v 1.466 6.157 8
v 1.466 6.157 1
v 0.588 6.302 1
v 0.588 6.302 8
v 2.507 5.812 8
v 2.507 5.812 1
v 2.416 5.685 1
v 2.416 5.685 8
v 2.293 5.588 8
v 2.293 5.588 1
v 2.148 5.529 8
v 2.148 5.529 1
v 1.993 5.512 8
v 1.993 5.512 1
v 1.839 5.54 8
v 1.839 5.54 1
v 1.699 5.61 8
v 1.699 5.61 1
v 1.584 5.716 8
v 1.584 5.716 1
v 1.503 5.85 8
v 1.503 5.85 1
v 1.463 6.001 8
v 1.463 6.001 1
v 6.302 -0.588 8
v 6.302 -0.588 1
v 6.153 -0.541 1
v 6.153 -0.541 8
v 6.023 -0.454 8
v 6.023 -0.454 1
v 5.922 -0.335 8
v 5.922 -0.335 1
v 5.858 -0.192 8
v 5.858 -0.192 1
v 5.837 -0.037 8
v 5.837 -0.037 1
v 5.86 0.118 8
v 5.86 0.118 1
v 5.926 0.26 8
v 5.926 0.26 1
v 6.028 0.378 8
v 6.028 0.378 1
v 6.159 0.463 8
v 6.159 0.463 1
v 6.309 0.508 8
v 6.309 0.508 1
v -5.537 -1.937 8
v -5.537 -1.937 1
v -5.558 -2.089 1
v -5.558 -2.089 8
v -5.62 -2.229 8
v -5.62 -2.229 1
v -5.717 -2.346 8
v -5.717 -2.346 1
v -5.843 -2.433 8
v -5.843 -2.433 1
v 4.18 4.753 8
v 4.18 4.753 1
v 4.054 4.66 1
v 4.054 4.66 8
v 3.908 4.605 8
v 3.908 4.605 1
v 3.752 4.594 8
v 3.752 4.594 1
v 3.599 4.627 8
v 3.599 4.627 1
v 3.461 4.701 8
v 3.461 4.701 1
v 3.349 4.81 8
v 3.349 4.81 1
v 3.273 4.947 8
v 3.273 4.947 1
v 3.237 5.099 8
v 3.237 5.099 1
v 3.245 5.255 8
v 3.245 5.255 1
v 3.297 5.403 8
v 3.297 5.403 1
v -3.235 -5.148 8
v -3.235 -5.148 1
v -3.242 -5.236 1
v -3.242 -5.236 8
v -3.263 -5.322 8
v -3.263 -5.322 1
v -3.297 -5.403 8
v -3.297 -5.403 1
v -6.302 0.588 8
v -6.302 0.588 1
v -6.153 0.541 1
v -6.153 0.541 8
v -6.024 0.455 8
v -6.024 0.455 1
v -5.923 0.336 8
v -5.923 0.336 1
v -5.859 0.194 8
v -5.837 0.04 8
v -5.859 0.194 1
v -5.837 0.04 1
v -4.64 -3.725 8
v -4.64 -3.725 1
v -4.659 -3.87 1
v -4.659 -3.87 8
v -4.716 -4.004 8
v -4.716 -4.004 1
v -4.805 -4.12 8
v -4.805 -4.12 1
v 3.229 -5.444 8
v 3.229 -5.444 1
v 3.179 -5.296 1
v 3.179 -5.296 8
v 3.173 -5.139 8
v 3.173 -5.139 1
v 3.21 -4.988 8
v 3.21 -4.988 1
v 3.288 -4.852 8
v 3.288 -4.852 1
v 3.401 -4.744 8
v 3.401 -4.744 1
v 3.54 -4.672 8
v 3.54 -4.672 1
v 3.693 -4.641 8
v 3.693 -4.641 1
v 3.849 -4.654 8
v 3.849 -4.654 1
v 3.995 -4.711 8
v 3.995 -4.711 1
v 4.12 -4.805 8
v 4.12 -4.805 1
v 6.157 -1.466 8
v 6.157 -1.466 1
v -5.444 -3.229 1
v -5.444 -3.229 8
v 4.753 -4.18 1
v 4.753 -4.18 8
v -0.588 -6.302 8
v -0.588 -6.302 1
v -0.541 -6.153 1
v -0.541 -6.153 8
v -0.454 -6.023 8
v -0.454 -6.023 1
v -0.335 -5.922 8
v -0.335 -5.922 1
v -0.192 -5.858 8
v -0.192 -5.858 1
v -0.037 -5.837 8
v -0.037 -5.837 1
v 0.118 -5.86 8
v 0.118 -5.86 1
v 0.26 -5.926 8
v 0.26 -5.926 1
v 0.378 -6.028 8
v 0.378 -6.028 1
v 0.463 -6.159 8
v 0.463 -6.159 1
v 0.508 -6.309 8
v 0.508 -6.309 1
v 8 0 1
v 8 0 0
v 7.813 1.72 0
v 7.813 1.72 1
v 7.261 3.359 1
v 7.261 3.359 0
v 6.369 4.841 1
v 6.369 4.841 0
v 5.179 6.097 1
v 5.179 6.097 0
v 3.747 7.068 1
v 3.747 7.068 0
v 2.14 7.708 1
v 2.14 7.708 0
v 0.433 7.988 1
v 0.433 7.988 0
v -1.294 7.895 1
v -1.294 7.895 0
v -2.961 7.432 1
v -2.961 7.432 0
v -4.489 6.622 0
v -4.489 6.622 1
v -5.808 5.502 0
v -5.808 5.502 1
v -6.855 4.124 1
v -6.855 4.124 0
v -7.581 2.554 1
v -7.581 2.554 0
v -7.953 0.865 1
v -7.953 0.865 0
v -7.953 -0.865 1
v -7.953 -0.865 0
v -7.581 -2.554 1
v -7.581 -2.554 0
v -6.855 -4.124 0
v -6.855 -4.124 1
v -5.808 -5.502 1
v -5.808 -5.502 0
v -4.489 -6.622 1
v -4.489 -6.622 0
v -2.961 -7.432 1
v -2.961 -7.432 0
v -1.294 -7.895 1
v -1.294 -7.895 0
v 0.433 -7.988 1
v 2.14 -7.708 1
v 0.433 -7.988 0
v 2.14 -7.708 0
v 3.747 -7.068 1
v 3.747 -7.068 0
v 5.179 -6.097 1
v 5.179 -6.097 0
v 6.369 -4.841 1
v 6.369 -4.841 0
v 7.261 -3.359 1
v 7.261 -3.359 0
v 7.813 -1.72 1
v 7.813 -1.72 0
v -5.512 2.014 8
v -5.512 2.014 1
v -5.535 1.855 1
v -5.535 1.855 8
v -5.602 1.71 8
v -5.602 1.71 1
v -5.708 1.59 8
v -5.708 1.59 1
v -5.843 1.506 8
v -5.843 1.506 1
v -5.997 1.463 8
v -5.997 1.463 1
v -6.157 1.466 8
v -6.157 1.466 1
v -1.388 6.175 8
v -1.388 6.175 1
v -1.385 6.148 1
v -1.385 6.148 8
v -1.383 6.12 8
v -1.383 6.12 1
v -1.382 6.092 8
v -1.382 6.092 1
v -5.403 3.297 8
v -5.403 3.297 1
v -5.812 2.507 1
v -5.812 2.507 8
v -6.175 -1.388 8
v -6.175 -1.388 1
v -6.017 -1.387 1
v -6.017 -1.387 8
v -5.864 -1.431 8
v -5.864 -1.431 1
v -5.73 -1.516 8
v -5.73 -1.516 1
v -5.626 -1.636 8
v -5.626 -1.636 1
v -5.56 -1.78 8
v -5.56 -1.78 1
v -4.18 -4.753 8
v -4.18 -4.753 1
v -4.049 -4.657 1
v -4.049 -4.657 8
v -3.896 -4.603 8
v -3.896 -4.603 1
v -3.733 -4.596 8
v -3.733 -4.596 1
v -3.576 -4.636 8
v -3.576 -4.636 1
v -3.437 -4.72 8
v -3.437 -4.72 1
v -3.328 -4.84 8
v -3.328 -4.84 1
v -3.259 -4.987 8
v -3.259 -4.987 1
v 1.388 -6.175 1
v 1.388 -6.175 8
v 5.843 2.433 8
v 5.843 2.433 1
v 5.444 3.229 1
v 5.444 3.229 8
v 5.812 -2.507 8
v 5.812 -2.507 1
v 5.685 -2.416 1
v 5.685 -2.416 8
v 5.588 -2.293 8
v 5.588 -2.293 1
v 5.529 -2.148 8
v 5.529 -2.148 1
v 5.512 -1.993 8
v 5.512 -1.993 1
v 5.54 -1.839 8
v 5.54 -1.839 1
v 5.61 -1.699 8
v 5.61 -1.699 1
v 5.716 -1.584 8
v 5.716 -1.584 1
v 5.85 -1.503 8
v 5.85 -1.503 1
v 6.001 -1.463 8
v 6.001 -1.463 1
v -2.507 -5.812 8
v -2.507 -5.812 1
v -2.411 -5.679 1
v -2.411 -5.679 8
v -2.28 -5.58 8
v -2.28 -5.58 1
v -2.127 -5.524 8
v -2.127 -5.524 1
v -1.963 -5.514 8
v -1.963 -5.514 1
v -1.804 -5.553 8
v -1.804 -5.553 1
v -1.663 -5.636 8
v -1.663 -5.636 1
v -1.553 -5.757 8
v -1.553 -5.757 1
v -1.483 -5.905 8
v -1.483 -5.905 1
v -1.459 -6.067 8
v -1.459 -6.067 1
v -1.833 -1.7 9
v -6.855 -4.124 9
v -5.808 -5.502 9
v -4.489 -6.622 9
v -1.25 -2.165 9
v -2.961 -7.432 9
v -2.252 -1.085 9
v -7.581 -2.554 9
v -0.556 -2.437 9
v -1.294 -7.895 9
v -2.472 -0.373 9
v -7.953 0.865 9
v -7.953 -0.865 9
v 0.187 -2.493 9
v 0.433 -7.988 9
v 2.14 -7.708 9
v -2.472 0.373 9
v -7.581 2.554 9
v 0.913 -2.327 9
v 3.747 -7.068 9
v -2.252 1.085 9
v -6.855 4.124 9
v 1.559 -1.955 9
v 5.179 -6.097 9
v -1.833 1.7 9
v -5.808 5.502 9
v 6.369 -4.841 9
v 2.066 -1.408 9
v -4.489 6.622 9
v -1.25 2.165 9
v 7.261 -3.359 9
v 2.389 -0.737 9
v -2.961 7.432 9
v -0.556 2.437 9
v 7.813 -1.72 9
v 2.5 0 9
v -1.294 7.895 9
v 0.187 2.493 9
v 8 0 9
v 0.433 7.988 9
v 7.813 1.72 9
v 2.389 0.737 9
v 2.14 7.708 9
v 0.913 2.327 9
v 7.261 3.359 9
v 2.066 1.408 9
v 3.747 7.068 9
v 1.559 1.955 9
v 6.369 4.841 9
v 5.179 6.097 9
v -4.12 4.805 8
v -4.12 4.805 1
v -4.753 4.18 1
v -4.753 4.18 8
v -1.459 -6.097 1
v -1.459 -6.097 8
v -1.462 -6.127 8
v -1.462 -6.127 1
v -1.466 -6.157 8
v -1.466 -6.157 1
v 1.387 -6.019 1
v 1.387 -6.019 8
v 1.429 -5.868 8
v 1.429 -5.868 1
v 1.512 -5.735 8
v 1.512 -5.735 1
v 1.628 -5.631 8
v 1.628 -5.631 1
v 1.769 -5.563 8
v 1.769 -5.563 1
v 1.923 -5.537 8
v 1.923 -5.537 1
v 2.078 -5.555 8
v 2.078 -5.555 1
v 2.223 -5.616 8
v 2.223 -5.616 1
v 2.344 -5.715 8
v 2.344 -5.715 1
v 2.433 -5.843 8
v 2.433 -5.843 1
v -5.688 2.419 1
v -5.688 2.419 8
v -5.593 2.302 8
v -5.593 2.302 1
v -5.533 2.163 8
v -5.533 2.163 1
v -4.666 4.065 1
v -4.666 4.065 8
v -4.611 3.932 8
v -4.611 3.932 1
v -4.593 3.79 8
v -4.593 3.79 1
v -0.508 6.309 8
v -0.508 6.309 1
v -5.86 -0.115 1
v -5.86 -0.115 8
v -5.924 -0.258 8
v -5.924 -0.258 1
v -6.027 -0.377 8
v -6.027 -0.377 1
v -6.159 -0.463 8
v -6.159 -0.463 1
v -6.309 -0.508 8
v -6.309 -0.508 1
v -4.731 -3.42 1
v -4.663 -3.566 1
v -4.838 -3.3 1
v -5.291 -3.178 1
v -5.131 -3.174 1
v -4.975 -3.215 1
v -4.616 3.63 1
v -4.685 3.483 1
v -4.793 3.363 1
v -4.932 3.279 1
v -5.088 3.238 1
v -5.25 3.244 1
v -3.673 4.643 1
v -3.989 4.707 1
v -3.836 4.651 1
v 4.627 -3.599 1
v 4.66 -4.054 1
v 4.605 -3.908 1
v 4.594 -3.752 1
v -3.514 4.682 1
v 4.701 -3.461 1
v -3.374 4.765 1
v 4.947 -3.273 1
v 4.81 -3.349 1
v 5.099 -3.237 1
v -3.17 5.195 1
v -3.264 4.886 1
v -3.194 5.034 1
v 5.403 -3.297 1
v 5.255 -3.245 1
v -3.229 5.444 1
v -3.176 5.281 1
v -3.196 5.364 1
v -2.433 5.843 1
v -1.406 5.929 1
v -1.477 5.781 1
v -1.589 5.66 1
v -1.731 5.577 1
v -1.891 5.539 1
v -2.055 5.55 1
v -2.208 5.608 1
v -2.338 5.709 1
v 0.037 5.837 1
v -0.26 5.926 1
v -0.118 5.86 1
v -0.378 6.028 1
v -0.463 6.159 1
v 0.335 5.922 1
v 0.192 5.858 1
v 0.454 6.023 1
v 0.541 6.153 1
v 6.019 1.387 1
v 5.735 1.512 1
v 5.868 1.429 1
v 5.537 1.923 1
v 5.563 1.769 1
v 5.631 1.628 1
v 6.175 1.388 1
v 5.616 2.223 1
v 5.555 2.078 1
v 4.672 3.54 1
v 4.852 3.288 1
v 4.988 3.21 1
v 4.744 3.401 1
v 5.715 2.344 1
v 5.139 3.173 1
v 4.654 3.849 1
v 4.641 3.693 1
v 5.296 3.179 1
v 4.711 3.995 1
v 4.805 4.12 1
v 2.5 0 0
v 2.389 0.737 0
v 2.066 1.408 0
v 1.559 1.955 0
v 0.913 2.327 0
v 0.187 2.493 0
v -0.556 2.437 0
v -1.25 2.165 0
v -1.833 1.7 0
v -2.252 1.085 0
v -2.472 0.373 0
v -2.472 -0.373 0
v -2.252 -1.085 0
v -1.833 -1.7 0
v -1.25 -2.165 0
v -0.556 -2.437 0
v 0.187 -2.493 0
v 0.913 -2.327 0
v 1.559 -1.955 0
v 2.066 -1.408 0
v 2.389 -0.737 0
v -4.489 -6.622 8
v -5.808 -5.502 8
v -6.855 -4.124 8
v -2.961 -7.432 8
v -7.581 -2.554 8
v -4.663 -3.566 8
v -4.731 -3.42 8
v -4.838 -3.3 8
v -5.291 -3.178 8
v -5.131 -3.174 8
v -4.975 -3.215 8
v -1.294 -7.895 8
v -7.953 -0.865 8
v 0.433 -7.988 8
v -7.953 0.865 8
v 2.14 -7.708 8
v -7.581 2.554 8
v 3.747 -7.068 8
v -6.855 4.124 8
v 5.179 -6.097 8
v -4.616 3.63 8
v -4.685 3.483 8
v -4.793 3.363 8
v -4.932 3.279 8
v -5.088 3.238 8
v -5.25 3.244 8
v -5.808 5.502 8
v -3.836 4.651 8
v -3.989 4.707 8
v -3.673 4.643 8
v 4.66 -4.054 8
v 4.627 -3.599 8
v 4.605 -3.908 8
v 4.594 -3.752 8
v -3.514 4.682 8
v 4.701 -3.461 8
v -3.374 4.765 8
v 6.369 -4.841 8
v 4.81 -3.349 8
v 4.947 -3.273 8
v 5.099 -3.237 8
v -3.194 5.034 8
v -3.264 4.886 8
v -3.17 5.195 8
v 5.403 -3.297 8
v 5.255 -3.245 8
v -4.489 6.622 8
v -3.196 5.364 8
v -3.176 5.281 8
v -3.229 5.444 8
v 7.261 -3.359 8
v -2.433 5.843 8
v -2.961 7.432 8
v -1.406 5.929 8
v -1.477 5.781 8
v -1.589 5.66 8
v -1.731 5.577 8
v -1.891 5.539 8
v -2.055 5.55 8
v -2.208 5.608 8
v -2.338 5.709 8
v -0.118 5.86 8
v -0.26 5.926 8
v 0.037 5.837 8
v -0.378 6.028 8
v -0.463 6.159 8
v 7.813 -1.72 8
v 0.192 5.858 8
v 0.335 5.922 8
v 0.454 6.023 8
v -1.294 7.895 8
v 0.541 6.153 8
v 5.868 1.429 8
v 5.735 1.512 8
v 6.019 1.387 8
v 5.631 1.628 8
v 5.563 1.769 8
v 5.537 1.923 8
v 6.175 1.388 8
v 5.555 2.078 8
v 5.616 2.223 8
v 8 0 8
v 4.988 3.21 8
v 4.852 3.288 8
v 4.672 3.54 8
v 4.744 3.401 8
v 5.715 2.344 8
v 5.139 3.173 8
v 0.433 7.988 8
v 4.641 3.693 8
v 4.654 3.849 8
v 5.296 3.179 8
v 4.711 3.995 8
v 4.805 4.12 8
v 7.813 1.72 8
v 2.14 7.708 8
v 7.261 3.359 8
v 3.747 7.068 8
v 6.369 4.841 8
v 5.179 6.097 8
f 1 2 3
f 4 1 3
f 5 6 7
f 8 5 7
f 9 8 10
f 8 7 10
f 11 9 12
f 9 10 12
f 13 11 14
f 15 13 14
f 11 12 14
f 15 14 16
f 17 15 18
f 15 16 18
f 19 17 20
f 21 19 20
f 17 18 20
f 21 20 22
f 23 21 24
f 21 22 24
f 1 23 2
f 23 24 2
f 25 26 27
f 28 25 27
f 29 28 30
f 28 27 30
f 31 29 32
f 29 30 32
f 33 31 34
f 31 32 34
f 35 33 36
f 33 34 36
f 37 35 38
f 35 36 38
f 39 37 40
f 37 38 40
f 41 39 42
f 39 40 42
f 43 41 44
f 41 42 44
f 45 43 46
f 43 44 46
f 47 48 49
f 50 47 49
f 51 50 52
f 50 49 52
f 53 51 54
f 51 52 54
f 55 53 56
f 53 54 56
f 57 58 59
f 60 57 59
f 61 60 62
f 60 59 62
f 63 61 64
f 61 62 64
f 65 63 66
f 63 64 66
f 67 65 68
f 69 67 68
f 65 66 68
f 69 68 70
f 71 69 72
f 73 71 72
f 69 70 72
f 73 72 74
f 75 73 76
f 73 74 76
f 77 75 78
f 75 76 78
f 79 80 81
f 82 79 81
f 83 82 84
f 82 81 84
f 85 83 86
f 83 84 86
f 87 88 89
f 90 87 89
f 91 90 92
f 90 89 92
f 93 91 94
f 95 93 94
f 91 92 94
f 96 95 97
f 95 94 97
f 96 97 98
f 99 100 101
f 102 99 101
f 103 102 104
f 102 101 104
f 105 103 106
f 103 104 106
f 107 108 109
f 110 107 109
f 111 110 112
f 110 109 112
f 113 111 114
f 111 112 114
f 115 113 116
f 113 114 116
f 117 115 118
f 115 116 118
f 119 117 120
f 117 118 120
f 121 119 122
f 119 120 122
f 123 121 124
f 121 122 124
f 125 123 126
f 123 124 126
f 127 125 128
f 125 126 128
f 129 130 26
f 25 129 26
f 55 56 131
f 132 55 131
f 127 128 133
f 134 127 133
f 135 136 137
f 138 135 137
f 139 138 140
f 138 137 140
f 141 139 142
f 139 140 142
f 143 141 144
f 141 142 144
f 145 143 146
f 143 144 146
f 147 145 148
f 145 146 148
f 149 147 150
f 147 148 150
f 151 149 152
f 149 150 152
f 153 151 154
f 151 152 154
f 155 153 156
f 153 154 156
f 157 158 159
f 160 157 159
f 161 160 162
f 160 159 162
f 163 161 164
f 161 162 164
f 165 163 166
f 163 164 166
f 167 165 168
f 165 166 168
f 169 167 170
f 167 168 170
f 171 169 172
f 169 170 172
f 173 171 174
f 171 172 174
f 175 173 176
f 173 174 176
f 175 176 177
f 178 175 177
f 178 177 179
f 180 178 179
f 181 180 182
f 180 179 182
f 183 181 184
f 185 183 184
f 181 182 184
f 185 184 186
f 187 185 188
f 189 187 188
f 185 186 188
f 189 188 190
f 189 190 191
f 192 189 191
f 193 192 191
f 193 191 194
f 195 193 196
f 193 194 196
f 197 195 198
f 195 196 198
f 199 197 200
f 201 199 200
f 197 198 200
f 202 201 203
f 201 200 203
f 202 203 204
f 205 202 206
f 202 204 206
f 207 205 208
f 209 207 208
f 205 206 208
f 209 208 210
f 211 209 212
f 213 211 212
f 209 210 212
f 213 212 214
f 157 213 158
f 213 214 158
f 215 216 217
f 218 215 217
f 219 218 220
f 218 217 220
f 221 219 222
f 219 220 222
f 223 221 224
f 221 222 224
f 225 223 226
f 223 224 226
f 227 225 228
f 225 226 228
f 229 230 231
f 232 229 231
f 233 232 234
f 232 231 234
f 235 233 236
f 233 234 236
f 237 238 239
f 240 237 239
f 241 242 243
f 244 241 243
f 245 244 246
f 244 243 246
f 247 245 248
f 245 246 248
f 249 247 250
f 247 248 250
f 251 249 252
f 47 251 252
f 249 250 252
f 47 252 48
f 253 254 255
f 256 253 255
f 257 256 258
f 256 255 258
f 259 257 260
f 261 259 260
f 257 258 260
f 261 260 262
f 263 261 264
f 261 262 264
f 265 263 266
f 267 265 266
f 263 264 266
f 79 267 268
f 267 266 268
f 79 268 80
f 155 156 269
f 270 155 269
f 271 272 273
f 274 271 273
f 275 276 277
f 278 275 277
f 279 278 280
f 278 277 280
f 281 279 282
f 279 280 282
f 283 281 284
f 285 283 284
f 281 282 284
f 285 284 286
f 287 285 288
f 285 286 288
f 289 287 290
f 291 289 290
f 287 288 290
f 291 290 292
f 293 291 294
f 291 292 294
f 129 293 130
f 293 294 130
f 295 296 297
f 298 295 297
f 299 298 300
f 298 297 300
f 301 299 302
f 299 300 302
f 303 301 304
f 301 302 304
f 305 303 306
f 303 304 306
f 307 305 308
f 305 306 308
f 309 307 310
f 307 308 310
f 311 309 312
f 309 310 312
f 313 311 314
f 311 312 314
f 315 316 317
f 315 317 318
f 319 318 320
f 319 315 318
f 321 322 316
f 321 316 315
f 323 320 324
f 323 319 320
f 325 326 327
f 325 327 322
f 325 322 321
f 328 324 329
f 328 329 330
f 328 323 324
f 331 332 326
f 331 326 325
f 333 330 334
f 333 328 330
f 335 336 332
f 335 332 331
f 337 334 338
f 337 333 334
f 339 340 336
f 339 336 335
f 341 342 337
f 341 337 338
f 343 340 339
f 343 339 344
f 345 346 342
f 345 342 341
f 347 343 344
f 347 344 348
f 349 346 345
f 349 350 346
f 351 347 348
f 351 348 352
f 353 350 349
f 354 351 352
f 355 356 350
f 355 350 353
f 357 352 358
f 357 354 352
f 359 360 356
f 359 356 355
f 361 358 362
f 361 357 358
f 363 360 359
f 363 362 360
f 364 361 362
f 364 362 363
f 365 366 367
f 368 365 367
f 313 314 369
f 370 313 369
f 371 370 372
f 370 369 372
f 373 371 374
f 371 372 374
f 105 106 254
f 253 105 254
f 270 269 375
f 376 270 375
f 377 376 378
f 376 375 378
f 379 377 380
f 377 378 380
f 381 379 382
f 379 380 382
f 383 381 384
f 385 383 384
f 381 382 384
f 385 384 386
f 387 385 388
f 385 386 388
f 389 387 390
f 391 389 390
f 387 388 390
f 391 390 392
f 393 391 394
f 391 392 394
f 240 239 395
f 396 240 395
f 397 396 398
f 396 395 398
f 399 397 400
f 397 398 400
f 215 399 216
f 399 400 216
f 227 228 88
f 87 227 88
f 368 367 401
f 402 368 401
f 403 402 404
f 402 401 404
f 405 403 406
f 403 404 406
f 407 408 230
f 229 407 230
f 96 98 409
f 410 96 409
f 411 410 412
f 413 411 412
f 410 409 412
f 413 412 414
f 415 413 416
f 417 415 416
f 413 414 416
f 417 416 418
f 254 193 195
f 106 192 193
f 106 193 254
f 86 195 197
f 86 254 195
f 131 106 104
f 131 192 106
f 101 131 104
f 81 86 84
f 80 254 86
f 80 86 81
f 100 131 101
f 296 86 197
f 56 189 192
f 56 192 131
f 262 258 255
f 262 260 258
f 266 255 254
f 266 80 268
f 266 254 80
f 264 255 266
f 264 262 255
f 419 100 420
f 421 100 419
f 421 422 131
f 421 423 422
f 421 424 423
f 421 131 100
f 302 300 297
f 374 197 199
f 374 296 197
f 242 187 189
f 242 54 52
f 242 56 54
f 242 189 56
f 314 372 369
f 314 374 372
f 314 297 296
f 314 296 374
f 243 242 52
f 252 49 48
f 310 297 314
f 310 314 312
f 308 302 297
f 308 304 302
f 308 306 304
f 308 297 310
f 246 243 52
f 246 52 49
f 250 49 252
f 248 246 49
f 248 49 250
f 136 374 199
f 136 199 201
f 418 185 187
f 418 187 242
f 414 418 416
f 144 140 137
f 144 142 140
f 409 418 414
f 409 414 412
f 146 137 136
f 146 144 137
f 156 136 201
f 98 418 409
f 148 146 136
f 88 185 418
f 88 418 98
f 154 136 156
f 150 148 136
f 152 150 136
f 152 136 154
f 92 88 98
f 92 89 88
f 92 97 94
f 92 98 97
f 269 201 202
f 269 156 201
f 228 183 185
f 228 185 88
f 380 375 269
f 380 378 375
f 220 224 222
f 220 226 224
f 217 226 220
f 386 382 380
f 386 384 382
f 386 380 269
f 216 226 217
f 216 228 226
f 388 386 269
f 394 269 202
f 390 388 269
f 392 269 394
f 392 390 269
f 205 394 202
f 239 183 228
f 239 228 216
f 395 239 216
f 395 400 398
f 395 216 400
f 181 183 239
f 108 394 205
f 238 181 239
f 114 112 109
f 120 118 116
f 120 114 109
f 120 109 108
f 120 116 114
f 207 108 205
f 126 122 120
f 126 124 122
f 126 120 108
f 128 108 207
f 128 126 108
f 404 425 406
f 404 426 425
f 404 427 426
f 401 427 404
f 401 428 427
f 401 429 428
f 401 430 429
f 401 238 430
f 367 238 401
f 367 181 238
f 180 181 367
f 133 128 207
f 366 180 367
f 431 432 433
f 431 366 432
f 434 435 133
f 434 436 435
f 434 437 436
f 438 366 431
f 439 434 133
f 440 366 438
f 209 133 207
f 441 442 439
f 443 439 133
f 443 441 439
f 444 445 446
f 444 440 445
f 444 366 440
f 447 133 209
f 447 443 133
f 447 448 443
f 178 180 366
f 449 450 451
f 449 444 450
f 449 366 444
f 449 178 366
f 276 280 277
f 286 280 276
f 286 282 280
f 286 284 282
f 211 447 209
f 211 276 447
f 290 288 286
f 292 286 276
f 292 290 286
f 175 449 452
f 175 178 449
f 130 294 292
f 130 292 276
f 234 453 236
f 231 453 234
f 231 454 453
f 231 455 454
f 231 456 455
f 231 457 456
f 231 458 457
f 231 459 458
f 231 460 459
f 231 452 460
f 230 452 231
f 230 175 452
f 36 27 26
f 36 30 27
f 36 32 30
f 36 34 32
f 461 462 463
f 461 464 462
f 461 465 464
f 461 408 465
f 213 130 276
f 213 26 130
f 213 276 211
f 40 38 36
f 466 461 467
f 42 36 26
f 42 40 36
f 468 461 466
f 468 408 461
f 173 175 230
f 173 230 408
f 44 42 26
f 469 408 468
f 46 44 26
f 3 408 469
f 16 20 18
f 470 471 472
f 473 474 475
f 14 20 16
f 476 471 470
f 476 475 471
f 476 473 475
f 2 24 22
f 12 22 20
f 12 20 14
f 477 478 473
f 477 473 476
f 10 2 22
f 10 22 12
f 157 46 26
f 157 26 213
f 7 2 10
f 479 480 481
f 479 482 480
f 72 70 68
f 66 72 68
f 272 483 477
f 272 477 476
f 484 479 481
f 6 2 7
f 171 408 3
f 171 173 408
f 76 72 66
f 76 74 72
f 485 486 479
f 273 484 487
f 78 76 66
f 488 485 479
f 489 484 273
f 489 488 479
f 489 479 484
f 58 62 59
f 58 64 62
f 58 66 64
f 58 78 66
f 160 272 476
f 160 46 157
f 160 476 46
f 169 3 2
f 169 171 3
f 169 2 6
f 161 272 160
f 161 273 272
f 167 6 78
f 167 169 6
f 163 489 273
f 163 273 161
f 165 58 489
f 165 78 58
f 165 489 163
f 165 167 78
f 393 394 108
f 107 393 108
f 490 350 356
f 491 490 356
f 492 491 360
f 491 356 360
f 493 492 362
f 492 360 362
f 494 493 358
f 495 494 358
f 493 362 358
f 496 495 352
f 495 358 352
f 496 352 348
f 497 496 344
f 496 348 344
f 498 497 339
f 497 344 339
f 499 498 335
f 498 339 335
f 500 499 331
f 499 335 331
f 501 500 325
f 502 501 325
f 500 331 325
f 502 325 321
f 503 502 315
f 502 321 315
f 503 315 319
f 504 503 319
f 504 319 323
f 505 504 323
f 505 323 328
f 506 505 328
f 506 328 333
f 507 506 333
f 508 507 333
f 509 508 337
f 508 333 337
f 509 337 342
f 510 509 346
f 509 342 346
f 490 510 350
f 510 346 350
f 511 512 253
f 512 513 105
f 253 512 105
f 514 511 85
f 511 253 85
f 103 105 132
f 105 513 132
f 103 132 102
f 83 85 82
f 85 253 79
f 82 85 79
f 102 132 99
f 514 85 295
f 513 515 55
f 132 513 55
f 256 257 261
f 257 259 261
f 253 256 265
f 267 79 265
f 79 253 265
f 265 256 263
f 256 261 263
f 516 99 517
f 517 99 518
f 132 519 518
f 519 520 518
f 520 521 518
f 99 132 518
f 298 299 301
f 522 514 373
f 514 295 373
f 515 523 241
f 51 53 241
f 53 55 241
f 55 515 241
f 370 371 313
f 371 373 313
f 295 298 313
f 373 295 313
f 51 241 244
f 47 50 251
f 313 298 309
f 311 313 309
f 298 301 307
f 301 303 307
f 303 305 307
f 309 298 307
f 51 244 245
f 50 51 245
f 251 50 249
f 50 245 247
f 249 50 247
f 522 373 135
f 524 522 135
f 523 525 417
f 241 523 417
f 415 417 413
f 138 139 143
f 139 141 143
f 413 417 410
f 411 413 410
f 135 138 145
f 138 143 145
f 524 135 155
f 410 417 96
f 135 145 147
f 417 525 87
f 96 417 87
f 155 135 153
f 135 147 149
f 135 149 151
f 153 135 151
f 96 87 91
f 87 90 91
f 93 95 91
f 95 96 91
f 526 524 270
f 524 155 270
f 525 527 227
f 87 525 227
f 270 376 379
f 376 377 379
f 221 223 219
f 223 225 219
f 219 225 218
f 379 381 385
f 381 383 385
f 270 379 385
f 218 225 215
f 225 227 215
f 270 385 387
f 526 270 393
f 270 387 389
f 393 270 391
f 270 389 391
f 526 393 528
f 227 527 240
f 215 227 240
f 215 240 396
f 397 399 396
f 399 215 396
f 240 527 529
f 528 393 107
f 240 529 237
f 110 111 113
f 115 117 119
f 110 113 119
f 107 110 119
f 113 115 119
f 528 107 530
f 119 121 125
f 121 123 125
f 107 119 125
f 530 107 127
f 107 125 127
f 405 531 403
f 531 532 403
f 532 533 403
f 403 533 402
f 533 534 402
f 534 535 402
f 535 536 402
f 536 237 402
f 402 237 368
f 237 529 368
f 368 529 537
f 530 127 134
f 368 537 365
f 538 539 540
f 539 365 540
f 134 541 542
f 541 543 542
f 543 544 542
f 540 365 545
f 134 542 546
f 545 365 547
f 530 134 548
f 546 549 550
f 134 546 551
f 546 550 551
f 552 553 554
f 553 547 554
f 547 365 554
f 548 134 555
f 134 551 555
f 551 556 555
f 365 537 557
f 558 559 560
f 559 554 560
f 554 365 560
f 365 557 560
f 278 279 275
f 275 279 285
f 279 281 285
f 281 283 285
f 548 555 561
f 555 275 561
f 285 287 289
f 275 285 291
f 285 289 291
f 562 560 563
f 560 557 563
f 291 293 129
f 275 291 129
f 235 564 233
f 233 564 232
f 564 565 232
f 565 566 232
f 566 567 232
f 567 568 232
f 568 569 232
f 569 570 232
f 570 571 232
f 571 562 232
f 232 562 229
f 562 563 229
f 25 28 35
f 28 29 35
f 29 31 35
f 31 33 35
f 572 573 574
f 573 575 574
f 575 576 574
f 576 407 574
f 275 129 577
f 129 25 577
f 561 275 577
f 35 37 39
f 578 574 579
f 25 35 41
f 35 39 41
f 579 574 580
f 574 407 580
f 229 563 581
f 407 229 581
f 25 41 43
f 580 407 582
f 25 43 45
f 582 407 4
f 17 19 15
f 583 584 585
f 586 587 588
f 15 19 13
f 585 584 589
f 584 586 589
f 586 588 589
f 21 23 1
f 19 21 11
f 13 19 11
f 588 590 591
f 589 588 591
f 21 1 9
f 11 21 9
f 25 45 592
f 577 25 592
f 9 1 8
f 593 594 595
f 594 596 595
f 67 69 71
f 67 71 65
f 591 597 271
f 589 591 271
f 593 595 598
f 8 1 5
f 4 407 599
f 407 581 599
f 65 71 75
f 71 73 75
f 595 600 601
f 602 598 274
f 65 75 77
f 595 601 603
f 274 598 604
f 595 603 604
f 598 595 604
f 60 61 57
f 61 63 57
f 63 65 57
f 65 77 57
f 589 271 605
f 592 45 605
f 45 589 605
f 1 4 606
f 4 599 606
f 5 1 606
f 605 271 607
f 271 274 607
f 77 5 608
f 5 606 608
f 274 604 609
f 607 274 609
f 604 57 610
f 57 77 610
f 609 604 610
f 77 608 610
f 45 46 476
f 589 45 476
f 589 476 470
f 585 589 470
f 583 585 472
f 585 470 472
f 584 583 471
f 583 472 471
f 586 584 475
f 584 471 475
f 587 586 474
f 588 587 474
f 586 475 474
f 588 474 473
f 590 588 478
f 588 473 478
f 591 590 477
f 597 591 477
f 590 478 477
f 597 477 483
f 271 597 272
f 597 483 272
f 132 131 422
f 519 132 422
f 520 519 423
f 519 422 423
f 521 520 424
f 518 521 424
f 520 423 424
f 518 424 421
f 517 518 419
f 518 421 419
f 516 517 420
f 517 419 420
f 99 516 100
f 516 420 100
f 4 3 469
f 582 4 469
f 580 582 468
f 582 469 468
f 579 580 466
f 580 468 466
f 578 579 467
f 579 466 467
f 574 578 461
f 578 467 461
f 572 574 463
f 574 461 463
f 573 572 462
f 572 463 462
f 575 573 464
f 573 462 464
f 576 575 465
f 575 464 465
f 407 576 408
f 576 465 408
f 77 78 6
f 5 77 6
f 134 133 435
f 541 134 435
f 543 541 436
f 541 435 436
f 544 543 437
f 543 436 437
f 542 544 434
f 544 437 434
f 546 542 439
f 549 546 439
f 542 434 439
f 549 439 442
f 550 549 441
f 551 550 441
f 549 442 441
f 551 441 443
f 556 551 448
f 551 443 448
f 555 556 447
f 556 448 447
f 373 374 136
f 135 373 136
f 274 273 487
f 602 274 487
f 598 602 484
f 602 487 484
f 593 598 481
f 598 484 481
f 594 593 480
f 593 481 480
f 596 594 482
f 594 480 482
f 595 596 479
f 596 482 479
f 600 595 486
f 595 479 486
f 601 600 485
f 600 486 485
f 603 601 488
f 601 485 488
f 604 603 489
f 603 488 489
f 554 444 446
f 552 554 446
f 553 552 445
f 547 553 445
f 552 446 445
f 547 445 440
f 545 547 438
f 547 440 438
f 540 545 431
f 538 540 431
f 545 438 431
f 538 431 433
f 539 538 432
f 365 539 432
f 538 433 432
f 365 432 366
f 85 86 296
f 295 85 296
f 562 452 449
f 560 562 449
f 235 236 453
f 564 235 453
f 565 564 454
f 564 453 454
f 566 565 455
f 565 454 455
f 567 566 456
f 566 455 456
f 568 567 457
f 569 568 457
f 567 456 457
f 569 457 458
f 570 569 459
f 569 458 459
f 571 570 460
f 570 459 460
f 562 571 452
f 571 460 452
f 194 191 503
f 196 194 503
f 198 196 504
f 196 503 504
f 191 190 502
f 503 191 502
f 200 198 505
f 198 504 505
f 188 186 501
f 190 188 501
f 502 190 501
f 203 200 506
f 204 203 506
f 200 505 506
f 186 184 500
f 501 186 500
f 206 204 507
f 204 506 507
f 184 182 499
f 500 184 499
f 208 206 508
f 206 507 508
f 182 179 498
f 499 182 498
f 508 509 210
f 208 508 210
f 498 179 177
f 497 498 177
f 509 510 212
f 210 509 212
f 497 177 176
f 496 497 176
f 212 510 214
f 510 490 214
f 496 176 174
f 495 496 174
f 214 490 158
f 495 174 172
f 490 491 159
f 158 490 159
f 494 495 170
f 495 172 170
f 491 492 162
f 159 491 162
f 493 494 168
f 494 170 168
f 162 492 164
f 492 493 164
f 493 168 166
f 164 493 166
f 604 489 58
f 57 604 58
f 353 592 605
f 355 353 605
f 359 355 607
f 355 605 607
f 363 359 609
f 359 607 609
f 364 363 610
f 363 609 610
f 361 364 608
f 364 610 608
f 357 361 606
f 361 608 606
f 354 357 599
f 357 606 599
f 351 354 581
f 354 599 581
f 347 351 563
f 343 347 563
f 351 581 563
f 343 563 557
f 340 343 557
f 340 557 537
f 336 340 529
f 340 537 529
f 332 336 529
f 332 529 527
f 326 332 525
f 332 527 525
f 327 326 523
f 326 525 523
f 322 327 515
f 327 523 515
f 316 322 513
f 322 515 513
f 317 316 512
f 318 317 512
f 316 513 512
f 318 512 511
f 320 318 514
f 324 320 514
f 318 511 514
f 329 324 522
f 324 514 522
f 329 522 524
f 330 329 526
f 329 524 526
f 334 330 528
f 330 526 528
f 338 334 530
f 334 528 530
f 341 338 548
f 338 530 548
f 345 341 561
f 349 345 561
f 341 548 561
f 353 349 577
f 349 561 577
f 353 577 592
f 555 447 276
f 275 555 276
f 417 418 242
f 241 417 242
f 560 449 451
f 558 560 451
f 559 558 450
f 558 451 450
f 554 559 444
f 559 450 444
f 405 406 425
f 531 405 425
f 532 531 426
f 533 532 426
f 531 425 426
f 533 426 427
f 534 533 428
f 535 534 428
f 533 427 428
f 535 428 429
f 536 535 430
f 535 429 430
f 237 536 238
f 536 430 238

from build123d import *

# Parameters (mm, degrees)
F0_R     = 8
F1_DEPTH = 1
F3_DEPTH = 7
F4_R     = 8
F5_DEPTH = 1
F6_R     = 2.5
F7_DEPTH = 9


with BuildPart() as f1:
    # F0 (on Top) → F1 (new body)
    with BuildSketch(Plane.XY):
        Circle(F0_R)
    extrude(amount=F1_DEPTH)

    # F2 (on face) → F3 (join)
    with BuildSketch(Plane.XY.offset(1)):
        with BuildLine():
            Line((3.2969840058, 5.4029047423), (2.5065493984, 5.8119440209))
            ThreePointArc((2.5065493984, 5.8119440209), (1.8388116131, 5.5402736363), (1.4660287385, 6.1572918501))
            Line((1.4660287385, 6.1572918501), (0.587880666, 6.3020535948))
            ThreePointArc((0.587880666, 6.3020535948), (0.0367750598, 5.8373373817), (-0.5084316362, 6.3089603312))
            Line((-0.5084316362, 6.3089603312), (-1.3883339221, 6.1752742538))
            ThreePointArc((-1.3883339221, 6.1752742538), (-1.3836134942, 6.133709972), (-1.3820370329, 6.0919082168))
            ThreePointArc((-1.3820370329, 6.0919082168), (-1.8091754115, 5.5518374754), (-2.4331231799, 5.843063818))
            Line((-2.4331231799, 5.843063818), (-3.2286487127, 5.4440160432))
            ThreePointArc((-3.2286487127, 5.4440160432), (-3.1846641182, 5.3230332658), (-3.1697348597, 5.1951716444))
            ThreePointArc((-3.1697348597, 5.1951716444), (-3.5139617494, 4.6817520343), (-4.1196436741, 4.8052075072))
            Line((-4.1196436741, 4.8052075072), (-4.7529208721, 4.1798596116))
            ThreePointArc((-4.7529208721, 4.1798596116), (-4.6344100765, 4.0006685847), (-4.5928296865, 3.7898954745))
            ThreePointArc((-4.5928296865, 3.7898954745), (-4.859335021, 3.3157690905), (-5.4029047423, 3.2969840058))
            Line((-5.4029047423, 3.2969840058), (-5.8119440209, 2.5065493984))
            ThreePointArc((-5.8119440209, 2.5065493984), (-5.5928926927, 2.3021325953), (-5.5120190767, 2.0136379298))
            ThreePointArc((-5.5120190767, 2.0136379298), (-5.707906552, 1.590479337), (-6.1572918501, 1.4660287385))
            Line((-6.1572918501, 1.4660287385), (-6.3020535948, 0.587880666))
            ThreePointArc((-6.3020535948, 0.587880666), (-5.9691677754, 0.3993839994), (-5.8373263682, 0.0402714747))
            ThreePointArc((-5.8373263682, 0.0402714747), (-5.9714385265, -0.3214997579), (-6.3089603312, -0.5084316362))
            Line((-6.3089603312, -0.5084316362), (-6.1752742538, -1.3883339221))
            ThreePointArc((-6.1752742538, -1.3883339221), (-5.7301369842, -1.5161491913), (-5.5369082168, -1.9370370329))
            ThreePointArc((-5.5369082168, -1.9370370329), (-5.6196087137, -2.228512897), (-5.843063818, -2.4331231799))
            Line((-5.843063818, -2.4331231799), (-5.4440160432, -3.2286487127))
            ThreePointArc((-5.4440160432, -3.2286487127), (-4.9036957803, -3.2524353565), (-4.6401716444, -3.7247348597))
            ThreePointArc((-4.6401716444, -3.7247348597), (-4.683090061, -3.938738252), (-4.8052075072, -4.1196436741))
            Line((-4.8052075072, -4.1196436741), (-4.1798596116, -4.7529208721))
            ThreePointArc((-4.1798596116, -4.7529208721), (-3.5758920821, -4.6357481031), (-3.2348954745, -5.1478296865))
            ThreePointArc((-3.2348954745, -5.1478296865), (-3.2506409589, -5.2790911335), (-3.2969840058, -5.4029047423))
            Line((-3.2969840058, -5.4029047423), (-2.5065493984, -5.8119440209))
            ThreePointArc((-2.5065493984, -5.8119440209), (-1.8823764829, -5.5277645611), (-1.4586379298, -6.0670190767))
            ThreePointArc((-1.4586379298, -6.0670190767), (-1.4604887179, -6.1123064857), (-1.4660287385, -6.1572918501))
            Line((-1.4660287385, -6.1572918501), (-0.587880666, -6.3020535948))
            ThreePointArc((-0.587880666, -6.3020535948), (-0.0367750598, -5.8373373817), (0.5084316362, -6.3089603312))
            Line((0.5084316362, -6.3089603312), (1.3883339221, -6.1752742538))
            ThreePointArc((1.3883339221, -6.1752742538), (1.7688612926, -5.5630018732), (2.4331231799, -5.843063818))
            Line((2.4331231799, -5.843063818), (3.2286487127, -5.4440160432))
            ThreePointArc((3.2286487127, -5.4440160432), (3.4013491773, -4.7441209815), (4.1196436741, -4.8052075072))
            Line((4.1196436741, -4.8052075072), (4.7529208721, -4.1798596116))
            ThreePointArc((4.7529208721, -4.1798596116), (4.7008893059, -3.460852474), (5.4029047423, -3.2969840058))
            Line((5.4029047423, -3.2969840058), (5.8119440209, -2.5065493984))
            ThreePointArc((5.8119440209, -2.5065493984), (5.5402736363, -1.8388116131), (6.1572918501, -1.4660287385))
            Line((6.1572918501, -1.4660287385), (6.3020535948, -0.587880666))
            ThreePointArc((6.3020535948, -0.587880666), (5.8373373817, -0.0367750598), (6.3089603312, 0.5084316362))
            Line((6.3089603312, 0.5084316362), (6.1752742538, 1.3883339221))
            ThreePointArc((6.1752742538, 1.3883339221), (5.5630018732, 1.7688612926), (5.843063818, 2.4331231799))
            Line((5.843063818, 2.4331231799), (5.4440160432, 3.2286487127))
            ThreePointArc((5.4440160432, 3.2286487127), (4.7441209815, 3.4013491773), (4.8052075072, 4.1196436741))
            Line((4.8052075072, 4.1196436741), (4.1798596116, 4.7529208721))
            ThreePointArc((4.1798596116, 4.7529208721), (3.460852474, 4.7008893059), (3.2969840058, 5.4029047423))
        make_face()
    extrude(amount=F3_DEPTH)

    # F4 (on face) → F5 (join)
    with BuildSketch(Plane.XY.offset(8)):
        Circle(F4_R)
    extrude(amount=F5_DEPTH)

    # F6 (on face) → F7 (cut)
    with BuildSketch(Plane.XY.offset(9)):
        Circle(F6_R)
    extrude(amount=-F7_DEPTH, mode=Mode.SUBTRACT)


solid = f1.part
